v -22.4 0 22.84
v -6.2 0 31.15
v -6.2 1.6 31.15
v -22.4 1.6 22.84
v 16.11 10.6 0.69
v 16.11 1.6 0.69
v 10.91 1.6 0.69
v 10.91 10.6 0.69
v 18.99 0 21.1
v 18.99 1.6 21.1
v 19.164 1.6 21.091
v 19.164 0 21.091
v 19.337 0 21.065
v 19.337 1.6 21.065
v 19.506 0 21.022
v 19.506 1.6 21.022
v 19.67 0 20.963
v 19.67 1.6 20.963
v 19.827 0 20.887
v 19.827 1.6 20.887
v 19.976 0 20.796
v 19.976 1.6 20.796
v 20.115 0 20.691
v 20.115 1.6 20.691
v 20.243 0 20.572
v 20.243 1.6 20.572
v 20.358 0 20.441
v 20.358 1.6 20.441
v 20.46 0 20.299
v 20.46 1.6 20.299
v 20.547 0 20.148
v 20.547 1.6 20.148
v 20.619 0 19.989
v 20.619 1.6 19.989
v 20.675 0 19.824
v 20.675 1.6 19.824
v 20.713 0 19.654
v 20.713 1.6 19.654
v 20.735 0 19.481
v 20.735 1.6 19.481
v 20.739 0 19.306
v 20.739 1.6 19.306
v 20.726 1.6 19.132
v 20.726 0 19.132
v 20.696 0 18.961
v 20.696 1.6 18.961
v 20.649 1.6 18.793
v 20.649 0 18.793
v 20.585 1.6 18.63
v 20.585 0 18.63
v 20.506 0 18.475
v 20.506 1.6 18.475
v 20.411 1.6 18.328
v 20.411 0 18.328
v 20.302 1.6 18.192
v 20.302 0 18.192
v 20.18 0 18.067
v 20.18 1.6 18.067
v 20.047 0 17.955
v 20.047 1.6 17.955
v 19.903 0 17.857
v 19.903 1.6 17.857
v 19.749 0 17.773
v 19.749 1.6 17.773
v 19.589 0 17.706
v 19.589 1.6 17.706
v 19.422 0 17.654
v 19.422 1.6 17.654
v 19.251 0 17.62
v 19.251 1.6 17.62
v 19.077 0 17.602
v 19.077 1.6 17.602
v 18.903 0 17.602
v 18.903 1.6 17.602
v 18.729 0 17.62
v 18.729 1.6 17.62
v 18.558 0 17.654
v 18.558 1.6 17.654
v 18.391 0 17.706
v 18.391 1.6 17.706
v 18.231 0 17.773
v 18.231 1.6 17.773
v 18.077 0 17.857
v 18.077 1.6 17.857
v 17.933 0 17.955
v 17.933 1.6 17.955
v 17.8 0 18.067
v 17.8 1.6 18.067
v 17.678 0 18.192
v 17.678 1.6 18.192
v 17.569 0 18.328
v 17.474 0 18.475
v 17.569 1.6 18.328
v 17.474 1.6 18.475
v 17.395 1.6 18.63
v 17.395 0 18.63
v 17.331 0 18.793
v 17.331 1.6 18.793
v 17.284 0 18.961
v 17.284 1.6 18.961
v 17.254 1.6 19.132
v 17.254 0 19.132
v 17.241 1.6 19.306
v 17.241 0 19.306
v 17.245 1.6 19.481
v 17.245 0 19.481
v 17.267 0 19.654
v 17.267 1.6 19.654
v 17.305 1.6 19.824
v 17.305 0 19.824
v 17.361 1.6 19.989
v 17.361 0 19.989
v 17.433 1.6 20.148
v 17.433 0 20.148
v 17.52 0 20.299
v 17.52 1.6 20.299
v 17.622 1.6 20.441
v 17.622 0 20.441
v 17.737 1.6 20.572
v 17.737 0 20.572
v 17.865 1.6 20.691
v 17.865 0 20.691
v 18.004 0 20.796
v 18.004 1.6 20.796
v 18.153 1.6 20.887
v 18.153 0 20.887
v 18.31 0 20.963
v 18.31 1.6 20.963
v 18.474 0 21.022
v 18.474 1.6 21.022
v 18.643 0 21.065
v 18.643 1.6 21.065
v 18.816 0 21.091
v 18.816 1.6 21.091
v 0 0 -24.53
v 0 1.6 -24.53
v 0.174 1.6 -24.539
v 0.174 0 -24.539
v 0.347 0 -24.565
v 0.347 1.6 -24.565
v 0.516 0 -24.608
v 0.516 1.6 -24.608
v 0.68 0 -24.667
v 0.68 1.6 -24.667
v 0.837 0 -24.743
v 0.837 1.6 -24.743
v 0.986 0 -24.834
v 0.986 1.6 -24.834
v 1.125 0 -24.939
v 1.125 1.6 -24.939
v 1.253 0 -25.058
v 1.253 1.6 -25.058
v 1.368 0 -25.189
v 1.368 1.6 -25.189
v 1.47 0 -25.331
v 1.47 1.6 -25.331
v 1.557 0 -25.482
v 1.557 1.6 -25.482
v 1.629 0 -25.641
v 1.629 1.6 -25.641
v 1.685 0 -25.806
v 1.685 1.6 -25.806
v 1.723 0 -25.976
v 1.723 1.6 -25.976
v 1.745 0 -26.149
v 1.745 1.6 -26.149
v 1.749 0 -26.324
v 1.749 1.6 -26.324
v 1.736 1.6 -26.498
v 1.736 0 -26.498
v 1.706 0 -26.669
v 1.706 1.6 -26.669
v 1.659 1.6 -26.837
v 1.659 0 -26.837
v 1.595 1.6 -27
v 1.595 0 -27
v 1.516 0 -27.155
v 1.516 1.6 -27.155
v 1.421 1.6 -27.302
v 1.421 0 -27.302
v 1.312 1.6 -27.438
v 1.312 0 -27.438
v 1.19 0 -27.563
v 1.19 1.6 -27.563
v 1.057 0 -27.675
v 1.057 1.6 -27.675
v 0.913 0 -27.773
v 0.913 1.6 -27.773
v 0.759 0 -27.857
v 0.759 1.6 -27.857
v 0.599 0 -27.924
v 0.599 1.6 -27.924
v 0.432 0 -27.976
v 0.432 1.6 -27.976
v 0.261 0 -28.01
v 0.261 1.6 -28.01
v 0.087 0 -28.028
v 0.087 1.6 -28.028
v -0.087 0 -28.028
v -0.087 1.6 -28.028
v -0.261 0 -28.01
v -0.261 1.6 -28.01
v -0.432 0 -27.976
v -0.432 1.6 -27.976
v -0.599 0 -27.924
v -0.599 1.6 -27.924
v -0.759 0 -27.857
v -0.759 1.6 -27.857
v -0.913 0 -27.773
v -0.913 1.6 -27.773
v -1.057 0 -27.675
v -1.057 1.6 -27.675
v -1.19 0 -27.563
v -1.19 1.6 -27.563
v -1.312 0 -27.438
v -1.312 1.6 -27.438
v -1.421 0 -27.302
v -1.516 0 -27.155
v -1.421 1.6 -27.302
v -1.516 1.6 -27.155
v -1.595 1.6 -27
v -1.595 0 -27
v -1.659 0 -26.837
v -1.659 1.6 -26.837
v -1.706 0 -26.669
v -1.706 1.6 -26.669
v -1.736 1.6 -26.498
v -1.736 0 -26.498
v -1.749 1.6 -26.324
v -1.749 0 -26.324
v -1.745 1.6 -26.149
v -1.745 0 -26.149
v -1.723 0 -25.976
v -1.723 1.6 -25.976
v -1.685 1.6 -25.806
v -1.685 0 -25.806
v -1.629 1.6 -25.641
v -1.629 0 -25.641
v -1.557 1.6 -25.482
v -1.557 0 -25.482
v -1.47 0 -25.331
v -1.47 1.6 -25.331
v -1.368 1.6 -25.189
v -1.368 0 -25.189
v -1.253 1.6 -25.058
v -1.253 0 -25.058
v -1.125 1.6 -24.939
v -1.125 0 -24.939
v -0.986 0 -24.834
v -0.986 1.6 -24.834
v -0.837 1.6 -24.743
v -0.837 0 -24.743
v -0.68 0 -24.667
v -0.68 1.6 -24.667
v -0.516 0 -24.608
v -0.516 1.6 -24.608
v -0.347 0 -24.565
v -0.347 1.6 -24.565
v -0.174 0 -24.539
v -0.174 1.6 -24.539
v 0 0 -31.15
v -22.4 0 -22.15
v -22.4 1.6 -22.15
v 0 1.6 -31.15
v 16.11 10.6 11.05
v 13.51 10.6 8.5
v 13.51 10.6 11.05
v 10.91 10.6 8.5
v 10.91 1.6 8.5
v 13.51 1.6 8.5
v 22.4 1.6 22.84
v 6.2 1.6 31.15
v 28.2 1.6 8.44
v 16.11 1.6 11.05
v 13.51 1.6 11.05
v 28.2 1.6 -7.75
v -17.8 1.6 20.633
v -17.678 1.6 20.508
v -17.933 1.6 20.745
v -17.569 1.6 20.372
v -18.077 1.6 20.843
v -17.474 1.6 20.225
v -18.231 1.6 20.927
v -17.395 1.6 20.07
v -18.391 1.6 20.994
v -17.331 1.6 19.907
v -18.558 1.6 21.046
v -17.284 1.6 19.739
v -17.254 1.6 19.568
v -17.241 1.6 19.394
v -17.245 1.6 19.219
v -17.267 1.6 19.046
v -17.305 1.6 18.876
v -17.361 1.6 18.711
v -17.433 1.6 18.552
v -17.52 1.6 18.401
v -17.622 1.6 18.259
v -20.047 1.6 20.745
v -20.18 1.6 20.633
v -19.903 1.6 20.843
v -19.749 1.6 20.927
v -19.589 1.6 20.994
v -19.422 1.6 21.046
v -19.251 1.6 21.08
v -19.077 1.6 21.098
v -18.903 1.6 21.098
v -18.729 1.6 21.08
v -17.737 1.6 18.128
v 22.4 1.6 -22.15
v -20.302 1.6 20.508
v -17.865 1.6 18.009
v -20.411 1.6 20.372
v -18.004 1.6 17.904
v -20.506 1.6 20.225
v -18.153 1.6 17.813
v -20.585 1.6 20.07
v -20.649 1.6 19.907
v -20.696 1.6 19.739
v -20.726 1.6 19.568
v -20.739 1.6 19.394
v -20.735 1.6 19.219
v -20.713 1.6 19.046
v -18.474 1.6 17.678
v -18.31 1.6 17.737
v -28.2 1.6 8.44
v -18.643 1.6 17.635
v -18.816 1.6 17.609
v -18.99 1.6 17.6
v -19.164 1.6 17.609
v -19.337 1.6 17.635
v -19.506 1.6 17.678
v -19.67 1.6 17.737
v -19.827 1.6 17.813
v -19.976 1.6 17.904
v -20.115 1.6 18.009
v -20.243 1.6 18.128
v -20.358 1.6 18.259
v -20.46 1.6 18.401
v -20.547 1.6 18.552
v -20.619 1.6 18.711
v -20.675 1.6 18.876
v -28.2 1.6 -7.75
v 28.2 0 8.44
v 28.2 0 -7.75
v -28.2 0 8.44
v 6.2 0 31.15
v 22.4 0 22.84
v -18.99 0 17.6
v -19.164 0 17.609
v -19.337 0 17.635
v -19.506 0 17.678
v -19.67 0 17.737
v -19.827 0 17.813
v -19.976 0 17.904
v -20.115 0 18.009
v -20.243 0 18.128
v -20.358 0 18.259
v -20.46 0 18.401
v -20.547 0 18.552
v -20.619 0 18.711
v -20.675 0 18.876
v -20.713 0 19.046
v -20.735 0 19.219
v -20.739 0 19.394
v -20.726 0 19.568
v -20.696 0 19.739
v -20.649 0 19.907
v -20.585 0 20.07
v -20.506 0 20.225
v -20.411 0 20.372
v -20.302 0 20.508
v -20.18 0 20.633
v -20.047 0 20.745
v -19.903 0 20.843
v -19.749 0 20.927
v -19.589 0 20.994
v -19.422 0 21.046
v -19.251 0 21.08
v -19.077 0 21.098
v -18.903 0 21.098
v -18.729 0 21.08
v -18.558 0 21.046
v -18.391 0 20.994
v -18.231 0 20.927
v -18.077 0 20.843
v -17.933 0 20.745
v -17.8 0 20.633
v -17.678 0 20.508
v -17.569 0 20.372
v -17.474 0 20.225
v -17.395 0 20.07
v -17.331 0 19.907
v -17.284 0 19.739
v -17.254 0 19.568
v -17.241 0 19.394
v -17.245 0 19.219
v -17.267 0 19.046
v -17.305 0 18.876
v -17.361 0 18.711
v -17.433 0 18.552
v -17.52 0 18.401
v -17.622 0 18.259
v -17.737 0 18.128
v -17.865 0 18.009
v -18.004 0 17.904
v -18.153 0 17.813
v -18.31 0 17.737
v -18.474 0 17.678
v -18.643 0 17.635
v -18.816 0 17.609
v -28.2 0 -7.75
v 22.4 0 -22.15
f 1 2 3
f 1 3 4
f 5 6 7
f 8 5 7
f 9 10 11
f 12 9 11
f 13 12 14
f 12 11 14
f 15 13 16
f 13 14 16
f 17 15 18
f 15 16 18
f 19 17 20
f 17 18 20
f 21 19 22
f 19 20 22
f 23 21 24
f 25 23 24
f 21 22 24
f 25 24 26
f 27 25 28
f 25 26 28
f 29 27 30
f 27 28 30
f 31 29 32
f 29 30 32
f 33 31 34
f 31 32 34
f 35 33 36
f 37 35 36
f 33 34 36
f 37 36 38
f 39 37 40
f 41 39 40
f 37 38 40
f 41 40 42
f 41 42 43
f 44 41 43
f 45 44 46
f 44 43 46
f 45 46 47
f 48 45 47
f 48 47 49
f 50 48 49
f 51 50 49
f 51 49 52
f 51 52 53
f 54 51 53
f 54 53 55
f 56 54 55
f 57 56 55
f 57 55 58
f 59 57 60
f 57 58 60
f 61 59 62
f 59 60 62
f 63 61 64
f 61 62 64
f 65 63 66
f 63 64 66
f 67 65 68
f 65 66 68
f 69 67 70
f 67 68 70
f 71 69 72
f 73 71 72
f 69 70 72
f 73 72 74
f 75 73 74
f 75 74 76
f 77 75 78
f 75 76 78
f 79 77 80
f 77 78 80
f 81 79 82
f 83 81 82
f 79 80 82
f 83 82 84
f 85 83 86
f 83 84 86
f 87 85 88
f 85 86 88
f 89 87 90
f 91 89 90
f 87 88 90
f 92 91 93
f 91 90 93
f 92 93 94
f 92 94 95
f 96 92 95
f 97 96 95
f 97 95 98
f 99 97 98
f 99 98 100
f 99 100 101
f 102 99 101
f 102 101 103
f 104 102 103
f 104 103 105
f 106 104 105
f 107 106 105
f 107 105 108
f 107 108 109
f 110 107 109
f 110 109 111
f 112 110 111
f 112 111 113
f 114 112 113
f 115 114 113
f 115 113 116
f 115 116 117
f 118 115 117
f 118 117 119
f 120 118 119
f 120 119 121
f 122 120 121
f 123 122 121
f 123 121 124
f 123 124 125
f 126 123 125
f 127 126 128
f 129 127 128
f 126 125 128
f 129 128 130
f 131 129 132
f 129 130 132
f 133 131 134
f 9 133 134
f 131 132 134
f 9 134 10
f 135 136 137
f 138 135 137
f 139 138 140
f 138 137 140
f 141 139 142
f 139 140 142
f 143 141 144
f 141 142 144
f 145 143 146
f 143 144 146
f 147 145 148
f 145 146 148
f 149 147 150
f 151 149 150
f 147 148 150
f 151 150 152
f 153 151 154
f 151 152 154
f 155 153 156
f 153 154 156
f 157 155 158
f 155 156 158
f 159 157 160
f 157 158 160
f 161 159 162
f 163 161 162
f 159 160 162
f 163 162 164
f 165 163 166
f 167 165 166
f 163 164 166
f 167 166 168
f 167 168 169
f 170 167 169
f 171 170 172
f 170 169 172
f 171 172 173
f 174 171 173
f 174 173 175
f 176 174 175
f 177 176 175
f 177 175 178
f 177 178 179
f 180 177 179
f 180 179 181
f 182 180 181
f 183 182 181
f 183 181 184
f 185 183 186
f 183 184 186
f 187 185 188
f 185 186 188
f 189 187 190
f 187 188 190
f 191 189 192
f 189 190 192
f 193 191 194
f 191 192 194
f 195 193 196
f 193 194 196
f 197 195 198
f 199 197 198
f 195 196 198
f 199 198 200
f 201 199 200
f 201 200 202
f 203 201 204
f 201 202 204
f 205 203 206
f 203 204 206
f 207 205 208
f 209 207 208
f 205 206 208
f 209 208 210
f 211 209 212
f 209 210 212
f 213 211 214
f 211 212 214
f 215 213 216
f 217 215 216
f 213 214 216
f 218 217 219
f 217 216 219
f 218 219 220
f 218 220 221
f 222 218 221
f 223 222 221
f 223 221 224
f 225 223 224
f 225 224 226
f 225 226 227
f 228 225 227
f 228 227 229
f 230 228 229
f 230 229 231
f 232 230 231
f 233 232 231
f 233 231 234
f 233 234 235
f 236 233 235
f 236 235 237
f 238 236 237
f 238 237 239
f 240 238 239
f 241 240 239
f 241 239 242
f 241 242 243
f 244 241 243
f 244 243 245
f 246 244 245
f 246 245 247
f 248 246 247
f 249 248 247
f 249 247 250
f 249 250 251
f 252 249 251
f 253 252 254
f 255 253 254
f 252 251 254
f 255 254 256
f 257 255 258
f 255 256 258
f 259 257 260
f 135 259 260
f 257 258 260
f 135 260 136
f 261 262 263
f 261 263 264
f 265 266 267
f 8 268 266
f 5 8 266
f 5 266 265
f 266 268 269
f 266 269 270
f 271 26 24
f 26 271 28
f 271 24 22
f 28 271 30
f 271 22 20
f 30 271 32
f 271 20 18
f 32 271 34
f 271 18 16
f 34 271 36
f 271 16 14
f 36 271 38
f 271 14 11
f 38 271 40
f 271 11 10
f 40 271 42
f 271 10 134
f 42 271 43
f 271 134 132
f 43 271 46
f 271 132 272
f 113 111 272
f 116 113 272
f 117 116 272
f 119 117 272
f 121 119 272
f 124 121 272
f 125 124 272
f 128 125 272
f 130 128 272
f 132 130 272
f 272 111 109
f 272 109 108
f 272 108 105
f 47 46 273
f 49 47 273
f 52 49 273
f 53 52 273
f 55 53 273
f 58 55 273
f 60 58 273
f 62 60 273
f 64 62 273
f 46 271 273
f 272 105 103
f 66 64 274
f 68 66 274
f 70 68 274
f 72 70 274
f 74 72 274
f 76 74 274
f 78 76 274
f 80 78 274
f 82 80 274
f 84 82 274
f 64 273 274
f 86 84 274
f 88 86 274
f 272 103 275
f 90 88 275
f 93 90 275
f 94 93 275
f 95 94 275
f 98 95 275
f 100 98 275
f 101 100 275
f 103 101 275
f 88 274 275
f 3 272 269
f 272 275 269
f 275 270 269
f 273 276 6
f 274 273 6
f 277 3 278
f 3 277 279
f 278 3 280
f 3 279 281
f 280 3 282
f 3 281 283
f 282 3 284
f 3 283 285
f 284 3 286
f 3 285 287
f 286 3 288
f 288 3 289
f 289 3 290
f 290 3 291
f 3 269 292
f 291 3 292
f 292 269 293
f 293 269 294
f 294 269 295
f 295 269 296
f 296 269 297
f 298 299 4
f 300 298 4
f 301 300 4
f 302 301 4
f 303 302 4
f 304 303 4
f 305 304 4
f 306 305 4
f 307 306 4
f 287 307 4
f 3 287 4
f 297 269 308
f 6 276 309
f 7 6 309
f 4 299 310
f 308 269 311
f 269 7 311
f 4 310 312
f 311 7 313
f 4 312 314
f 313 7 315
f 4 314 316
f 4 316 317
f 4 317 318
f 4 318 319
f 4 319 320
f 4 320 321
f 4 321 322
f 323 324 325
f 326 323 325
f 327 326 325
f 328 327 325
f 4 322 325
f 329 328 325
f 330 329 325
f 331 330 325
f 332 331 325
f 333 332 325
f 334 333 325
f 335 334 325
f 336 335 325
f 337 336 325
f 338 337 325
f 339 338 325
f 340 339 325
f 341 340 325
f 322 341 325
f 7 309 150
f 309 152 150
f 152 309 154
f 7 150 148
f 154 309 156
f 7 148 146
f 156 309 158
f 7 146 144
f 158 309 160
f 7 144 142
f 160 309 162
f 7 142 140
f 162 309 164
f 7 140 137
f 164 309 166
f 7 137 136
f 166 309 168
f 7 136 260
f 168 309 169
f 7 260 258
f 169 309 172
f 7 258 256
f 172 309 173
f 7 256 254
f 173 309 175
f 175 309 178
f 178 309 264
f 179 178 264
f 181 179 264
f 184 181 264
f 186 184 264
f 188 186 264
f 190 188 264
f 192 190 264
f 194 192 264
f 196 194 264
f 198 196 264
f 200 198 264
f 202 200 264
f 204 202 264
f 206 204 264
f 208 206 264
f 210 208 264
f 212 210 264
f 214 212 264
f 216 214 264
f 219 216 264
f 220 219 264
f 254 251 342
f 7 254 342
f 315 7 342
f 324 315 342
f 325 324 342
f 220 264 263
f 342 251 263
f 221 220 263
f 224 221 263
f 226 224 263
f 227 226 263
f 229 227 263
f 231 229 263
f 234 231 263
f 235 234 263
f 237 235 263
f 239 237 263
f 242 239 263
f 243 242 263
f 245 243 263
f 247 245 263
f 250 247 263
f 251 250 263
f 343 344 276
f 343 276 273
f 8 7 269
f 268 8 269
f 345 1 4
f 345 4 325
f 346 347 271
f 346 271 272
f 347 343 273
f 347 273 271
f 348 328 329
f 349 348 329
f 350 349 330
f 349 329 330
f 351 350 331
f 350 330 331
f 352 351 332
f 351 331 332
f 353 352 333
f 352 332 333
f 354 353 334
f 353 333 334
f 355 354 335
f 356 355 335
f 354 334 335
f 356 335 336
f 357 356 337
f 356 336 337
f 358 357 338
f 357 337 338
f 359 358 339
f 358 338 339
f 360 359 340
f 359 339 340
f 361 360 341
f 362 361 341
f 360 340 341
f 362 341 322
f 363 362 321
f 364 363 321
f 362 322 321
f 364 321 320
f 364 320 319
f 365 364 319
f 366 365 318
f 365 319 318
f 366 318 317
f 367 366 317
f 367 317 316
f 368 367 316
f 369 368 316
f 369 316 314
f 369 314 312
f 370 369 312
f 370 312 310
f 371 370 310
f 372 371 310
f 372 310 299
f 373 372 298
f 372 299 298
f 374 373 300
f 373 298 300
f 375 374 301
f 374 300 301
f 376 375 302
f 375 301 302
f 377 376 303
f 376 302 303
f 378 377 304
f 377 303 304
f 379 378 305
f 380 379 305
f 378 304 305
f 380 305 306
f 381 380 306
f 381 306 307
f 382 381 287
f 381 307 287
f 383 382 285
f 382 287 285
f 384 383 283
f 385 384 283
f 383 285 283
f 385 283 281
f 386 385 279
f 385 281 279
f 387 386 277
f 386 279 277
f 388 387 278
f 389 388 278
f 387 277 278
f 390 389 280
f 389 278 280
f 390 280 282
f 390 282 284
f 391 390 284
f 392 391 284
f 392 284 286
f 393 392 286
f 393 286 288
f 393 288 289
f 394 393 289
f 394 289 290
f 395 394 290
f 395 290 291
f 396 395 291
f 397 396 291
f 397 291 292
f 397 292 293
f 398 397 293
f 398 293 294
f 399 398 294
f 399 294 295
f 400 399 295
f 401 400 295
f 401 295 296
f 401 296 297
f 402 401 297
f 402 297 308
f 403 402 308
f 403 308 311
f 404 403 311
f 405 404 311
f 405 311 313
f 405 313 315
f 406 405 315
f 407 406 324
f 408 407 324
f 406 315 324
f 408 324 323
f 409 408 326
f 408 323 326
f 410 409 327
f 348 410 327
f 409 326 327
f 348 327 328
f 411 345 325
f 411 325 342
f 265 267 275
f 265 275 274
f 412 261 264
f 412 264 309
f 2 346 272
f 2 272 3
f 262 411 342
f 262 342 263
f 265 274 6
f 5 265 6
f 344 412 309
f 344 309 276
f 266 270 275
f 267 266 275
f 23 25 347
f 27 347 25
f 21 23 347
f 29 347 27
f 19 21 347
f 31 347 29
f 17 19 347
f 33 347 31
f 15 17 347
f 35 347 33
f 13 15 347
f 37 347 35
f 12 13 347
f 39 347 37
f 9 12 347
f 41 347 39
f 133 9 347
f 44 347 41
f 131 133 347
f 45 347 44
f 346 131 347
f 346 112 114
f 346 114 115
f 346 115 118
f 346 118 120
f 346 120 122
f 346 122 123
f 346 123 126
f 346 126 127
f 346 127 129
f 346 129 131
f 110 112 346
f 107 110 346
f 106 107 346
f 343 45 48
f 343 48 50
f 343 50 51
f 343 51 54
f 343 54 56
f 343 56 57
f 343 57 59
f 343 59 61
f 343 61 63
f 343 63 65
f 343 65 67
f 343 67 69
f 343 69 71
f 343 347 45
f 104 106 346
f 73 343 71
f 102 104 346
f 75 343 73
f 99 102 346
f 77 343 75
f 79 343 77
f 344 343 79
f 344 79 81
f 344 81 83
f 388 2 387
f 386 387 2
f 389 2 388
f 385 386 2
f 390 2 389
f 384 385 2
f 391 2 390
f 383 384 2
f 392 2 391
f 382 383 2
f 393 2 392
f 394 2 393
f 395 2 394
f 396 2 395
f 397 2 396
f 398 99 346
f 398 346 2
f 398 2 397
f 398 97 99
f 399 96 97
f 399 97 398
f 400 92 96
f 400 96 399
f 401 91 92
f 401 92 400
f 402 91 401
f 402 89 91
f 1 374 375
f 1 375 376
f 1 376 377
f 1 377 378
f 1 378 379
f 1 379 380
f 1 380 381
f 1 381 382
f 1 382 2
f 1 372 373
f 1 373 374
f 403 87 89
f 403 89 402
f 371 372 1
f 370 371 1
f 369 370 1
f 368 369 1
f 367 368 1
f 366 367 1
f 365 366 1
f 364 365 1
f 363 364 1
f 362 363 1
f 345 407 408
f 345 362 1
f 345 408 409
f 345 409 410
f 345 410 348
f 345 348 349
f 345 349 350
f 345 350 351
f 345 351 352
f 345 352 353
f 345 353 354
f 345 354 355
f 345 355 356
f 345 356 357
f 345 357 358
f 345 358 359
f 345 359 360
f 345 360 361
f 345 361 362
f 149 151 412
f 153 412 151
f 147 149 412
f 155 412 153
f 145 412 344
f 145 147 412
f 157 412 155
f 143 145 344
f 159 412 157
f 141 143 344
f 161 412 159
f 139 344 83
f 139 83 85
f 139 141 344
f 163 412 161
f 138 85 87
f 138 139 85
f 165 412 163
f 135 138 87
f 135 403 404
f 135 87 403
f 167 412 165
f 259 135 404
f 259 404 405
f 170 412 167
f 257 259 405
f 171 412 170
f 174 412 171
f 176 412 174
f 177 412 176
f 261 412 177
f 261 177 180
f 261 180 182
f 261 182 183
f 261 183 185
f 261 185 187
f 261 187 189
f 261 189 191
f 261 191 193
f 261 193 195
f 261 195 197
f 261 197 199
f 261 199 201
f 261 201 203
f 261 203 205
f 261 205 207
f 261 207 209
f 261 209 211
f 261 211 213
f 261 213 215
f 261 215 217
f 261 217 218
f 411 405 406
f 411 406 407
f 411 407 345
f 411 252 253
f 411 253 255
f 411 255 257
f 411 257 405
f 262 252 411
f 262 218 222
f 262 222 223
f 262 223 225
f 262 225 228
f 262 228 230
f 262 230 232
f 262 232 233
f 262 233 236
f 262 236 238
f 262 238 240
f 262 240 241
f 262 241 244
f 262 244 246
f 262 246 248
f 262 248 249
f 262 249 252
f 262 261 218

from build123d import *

# Parameters (mm, degrees)
BOSS_EXTRUDE1_DEPTH = 1.6
SKETCH2_R           = 1.75
CUT_EXTRUDE1_DEPTH  = 1.6
BOSS_EXTRUDE2_DEPTH = 9


with BuildPart() as part:
    # Sketch1 → Boss-Extrude1 (new body)
    with BuildSketch(Plane(origin=(0, 0, 0), x_dir=(1, 0, 0), z_dir=(0, 1, 0))):
        Polygon((0, 31.15), (22.4, 22.15), (28.2, 7.75), (28.2, -8.44), (22.4, -22.84), (6.2, -31.15), (-6.2, -31.15), (-22.4, -22.84), (-28.2, -8.44), (-28.2, 7.75), (-22.4, 22.15), align=None)
    extrude(amount=BOSS_EXTRUDE1_DEPTH)

    # Sketch2 → Cut-Extrude1 (cut)
    with BuildSketch(Plane(origin=(0, 1.6, 0), x_dir=(1, 0, 0), z_dir=(0, 1, 0))):
        with Locations(Location((0, 26.28, 0), (0, 0, 270))):
            Circle(SKETCH2_R)
        with Locations(Location((18.99, -19.35, 0), (0, 0, 270))):
            Circle(SKETCH2_R)
        with Locations(Location((-18.99, -19.35, 0), (0, 0, 90))):
            Circle(SKETCH2_R)
    extrude(amount=-CUT_EXTRUDE1_DEPTH, mode=Mode.SUBTRACT)

    # Sketch3 → Boss-Extrude2 (add)
    with BuildSketch(Plane(origin=(0, 1.6, 0), x_dir=(1, 0, 0), z_dir=(0, 1, 0))):
        Polygon((13.51, -8.5), (13.51, -11.05), (16.11, -11.05), (16.11, -0.69), (13.51, -0.69), (10.91, -0.69), (10.91, -8.5), align=None)
    extrude(amount=BOSS_EXTRUDE2_DEPTH)


solid = part.part
